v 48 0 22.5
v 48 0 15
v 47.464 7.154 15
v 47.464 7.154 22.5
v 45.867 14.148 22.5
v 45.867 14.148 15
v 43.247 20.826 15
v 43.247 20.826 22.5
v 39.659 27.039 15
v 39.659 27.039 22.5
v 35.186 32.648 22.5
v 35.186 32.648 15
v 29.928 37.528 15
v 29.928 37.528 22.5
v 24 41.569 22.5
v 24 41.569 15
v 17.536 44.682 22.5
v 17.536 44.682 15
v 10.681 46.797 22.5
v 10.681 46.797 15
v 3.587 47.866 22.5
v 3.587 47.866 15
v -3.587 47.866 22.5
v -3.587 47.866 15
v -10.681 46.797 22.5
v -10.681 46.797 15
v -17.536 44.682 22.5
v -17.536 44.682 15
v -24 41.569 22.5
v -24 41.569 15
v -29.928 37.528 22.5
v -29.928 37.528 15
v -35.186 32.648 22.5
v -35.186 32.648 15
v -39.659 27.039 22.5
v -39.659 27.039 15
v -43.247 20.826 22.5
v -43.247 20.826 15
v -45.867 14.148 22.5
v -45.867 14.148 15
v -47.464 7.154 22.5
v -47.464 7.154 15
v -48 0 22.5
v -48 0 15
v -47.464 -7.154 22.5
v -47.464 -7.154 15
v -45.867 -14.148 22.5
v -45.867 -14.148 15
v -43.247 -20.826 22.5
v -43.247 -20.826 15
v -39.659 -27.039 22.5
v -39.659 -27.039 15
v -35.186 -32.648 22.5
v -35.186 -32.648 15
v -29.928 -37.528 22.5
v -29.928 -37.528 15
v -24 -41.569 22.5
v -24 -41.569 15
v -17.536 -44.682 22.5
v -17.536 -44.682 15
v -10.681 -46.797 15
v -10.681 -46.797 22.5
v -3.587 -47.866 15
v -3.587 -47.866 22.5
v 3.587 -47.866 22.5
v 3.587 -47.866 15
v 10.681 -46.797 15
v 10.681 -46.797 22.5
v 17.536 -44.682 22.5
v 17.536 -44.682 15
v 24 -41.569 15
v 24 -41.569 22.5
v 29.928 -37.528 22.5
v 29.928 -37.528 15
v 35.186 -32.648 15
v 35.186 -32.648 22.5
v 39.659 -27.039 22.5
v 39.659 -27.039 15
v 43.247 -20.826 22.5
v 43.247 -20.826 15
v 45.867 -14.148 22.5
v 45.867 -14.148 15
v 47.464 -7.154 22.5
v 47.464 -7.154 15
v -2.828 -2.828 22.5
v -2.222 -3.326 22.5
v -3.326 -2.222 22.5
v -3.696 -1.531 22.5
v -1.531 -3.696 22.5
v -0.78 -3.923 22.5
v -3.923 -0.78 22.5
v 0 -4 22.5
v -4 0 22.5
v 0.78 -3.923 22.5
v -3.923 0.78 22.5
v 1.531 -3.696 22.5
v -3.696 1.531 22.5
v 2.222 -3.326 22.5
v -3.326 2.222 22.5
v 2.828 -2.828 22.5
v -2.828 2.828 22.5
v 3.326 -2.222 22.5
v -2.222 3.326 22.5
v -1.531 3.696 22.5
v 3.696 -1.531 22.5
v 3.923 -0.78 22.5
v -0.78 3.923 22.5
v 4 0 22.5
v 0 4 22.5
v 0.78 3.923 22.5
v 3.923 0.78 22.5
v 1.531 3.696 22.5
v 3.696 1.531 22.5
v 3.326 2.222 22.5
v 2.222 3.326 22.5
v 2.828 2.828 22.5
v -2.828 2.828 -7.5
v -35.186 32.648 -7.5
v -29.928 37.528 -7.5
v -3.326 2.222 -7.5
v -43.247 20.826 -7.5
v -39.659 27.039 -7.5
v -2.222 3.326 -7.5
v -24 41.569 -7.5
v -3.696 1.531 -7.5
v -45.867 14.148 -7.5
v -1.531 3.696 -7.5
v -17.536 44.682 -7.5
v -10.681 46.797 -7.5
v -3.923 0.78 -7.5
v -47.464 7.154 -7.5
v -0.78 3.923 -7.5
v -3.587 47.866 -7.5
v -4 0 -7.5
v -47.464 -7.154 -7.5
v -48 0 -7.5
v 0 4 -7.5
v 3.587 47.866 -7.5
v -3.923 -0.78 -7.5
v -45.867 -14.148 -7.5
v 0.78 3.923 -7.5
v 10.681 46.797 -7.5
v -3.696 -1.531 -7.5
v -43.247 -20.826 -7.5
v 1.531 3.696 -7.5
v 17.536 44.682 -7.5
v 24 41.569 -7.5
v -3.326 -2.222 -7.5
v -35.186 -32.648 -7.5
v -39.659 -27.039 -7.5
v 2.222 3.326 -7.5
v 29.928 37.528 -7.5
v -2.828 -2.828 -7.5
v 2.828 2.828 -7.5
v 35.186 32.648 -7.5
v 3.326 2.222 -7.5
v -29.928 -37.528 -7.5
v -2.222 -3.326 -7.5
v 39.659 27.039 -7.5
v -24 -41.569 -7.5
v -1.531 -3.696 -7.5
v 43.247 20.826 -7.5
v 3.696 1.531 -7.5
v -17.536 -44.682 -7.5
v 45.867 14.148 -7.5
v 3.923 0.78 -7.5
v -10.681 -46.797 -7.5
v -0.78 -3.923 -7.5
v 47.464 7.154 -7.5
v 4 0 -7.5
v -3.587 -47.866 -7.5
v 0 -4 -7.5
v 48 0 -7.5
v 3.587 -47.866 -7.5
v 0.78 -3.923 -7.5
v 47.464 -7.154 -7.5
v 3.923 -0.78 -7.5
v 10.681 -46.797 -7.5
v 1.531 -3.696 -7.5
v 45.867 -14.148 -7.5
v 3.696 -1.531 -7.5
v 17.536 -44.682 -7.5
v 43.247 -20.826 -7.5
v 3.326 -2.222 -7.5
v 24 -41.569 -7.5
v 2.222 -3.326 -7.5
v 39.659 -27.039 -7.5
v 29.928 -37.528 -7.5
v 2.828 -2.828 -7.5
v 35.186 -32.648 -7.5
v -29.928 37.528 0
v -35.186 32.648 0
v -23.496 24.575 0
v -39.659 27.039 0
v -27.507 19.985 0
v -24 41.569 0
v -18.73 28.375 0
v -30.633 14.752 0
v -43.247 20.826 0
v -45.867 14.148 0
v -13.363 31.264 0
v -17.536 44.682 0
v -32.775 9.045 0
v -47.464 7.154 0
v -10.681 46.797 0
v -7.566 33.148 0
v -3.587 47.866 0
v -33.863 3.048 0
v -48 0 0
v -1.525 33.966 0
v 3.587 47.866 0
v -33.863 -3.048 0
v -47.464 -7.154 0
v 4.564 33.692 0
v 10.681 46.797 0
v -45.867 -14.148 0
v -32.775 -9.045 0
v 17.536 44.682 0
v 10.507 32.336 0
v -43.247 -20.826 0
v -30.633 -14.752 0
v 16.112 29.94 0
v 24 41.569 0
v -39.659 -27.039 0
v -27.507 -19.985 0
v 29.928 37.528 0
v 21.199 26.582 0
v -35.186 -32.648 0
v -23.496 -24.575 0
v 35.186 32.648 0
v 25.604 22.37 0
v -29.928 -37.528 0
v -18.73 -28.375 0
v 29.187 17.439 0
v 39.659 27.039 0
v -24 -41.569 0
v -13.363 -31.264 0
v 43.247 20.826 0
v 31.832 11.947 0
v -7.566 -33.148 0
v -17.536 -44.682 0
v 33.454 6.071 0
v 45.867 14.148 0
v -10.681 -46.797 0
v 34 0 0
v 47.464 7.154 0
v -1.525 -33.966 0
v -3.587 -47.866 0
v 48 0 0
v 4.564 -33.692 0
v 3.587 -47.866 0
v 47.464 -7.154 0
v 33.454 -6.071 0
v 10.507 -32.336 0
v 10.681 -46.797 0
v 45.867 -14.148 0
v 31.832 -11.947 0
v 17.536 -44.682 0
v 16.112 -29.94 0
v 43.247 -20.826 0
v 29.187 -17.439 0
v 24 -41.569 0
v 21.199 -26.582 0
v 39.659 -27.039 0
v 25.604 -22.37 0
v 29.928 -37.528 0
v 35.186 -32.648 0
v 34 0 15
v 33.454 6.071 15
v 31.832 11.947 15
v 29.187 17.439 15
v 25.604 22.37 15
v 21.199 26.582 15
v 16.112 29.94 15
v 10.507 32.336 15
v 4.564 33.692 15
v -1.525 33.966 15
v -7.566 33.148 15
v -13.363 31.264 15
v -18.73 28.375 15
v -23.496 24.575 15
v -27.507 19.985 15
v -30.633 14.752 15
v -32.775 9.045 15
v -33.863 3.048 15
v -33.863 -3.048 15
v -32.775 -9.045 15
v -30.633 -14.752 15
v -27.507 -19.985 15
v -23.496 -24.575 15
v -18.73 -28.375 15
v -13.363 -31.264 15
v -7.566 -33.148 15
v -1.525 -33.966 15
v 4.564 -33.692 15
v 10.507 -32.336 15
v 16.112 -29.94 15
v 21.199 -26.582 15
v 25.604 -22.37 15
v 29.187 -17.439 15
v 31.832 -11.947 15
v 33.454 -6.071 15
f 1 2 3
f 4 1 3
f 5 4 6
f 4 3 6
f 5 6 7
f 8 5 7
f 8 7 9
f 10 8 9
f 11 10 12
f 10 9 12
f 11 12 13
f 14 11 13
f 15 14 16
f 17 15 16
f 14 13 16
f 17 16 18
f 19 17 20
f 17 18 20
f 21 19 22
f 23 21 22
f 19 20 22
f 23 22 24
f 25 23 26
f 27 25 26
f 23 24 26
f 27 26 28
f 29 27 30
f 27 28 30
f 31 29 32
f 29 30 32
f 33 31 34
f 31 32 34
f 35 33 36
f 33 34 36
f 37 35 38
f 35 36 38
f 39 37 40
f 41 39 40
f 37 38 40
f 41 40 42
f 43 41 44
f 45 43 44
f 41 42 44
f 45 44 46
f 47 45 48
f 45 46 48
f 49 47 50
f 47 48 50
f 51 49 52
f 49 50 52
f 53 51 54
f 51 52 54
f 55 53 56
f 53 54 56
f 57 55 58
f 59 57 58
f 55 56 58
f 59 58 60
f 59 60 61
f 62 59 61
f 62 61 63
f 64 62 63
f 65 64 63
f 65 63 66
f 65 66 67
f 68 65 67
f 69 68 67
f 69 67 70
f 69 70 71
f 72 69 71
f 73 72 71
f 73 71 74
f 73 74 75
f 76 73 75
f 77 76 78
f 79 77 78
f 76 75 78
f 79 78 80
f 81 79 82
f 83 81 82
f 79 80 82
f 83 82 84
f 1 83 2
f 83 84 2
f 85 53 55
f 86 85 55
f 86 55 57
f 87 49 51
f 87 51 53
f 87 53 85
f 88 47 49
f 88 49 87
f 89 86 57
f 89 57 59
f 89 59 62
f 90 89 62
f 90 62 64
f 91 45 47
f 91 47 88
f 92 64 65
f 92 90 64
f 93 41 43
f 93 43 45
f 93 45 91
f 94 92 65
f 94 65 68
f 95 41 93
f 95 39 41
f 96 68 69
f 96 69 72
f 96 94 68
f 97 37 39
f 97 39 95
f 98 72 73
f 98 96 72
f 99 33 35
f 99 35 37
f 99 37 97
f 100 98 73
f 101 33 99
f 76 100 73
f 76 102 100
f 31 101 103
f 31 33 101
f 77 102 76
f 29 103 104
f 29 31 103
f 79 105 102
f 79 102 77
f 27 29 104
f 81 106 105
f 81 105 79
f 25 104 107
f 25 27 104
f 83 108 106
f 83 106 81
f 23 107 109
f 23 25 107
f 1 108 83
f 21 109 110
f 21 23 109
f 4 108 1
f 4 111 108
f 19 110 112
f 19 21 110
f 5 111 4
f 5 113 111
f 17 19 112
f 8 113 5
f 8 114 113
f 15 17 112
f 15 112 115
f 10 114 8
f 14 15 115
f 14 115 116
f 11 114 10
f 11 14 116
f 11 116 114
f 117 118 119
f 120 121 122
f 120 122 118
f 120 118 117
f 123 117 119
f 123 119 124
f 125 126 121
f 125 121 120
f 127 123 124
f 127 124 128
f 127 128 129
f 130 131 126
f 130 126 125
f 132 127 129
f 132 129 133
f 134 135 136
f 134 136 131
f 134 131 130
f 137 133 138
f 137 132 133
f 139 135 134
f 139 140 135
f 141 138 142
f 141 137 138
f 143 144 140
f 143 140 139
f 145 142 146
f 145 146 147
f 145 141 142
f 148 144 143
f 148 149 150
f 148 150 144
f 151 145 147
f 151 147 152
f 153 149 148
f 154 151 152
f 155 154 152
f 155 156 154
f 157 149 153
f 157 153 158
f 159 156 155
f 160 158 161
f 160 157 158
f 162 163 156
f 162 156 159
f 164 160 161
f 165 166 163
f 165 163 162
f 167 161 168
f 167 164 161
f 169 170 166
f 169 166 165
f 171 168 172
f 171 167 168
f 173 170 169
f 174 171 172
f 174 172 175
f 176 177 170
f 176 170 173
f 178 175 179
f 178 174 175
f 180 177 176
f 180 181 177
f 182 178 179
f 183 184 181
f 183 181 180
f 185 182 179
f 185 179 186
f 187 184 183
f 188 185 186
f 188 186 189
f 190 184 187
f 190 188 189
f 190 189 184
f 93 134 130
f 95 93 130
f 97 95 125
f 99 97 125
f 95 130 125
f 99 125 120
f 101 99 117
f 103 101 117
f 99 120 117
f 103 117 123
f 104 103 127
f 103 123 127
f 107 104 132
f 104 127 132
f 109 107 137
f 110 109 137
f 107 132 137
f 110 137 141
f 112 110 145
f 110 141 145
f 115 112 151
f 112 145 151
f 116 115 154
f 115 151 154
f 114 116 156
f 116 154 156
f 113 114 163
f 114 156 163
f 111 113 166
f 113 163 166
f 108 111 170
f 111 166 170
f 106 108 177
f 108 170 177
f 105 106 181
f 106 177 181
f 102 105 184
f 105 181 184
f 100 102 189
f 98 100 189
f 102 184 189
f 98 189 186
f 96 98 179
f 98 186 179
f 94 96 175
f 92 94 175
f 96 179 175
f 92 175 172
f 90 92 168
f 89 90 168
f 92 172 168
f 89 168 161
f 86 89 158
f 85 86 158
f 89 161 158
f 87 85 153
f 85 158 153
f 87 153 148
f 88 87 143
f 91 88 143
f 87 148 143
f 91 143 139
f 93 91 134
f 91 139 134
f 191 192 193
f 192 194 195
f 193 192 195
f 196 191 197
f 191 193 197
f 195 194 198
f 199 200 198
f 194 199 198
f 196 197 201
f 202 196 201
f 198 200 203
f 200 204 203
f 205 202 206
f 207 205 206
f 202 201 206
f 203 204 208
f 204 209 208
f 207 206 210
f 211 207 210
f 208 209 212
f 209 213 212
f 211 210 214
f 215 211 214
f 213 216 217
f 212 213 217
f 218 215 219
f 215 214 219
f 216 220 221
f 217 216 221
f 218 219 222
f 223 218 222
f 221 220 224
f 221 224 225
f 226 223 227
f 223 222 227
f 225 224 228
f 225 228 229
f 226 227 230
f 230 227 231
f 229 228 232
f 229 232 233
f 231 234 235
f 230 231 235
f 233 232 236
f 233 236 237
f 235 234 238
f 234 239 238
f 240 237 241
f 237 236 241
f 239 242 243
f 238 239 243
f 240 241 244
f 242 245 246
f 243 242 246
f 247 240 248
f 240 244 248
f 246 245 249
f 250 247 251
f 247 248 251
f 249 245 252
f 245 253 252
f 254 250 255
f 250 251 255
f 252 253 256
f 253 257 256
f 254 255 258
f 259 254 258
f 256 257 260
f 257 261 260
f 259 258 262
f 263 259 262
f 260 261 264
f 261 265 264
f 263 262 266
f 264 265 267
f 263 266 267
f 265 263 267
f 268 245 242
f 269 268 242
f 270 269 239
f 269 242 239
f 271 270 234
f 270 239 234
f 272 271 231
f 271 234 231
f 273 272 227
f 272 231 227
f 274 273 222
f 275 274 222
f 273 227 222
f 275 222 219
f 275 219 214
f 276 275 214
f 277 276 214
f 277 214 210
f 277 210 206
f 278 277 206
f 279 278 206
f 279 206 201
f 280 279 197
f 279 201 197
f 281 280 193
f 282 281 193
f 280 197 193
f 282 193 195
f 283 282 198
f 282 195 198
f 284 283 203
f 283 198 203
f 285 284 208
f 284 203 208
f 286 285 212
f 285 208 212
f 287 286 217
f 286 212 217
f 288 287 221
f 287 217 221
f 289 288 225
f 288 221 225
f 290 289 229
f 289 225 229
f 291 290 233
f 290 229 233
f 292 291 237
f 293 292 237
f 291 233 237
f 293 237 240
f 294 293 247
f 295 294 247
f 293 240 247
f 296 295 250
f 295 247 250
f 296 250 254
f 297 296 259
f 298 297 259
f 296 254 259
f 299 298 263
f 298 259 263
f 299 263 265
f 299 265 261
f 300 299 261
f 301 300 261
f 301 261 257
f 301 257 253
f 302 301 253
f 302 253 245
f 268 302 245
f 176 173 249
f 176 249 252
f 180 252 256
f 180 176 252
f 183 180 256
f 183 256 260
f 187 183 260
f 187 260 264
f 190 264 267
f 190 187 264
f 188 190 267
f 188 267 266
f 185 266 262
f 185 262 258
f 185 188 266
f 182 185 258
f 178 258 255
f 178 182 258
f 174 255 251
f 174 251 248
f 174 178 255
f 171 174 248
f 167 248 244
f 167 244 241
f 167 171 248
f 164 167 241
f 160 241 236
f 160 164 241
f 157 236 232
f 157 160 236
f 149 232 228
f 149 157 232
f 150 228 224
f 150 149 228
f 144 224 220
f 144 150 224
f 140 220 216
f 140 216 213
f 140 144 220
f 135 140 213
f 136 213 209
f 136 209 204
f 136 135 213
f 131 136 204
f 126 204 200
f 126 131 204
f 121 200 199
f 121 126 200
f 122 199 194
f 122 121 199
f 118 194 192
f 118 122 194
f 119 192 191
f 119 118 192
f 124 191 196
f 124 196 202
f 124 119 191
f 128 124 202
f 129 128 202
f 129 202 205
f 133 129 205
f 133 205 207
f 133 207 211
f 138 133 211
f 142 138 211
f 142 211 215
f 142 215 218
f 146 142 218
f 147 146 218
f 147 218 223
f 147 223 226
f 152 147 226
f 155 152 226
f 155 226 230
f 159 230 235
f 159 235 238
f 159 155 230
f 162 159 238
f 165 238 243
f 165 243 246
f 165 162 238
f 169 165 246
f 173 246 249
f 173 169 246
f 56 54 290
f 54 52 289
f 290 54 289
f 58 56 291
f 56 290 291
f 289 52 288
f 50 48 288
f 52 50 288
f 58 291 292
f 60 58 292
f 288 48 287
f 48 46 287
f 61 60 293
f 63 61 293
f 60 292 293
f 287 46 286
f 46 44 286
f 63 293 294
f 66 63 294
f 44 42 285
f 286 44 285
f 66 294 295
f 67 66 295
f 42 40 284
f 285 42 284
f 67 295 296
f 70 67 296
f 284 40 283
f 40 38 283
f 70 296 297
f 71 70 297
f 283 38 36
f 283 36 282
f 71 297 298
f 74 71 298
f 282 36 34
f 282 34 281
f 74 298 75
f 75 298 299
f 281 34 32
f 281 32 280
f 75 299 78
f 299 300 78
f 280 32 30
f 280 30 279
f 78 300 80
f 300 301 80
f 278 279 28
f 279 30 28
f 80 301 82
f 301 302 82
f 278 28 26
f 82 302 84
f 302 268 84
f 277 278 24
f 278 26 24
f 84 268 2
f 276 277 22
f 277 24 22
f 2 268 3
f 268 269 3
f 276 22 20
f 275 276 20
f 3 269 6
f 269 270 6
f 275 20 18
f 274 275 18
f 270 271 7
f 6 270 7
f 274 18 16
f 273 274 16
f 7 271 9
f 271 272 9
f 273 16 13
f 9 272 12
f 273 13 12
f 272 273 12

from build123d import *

# Parameters (mm, degrees)
SKETCH1_R           = 34
BOSS_EXTRUDE1_DEPTH = 15
SKETCH2_R           = 48
BOSS_EXTRUDE2_DEPTH = 7.5
BOSS_EXTRUDE3_START = 7.5
SKETCH3_R           = 48
BOSS_EXTRUDE3_DEPTH = 7.5
SKETCH4_R           = 4
CUT_EXTRUDE1_DEPTH  = 30


with BuildPart() as part:
    # Sketch1 → Boss-Extrude1 (new body)
    with BuildSketch(Plane.XY):
        Circle(SKETCH1_R)
    extrude(amount=BOSS_EXTRUDE1_DEPTH)

    # Sketch2 → Boss-Extrude2 (add)
    with BuildSketch(Plane.XY.offset(15)):
        Circle(SKETCH2_R)
    extrude(amount=BOSS_EXTRUDE2_DEPTH)

    # Sketch3 → Boss-Extrude3 (add)
    with BuildSketch(Plane(origin=(0, 0, 0), x_dir=(-1, 0, 0), z_dir=(0, 0, -1)).offset(BOSS_EXTRUDE3_START)):
        with Locations(Location((0, 0, 0), (0, 0, 180))):
            Circle(SKETCH3_R)
    extrude(amount=-BOSS_EXTRUDE3_DEPTH)

    # Sketch4 → Cut-Extrude1 (cut)
    with BuildSketch(Plane(origin=(0, 0, -7.5), x_dir=(-1, 0, 0), z_dir=(0, 0, -1))):
        Circle(SKETCH4_R)
    extrude(amount=-CUT_EXTRUDE1_DEPTH, mode=Mode.SUBTRACT)


solid = part.part
